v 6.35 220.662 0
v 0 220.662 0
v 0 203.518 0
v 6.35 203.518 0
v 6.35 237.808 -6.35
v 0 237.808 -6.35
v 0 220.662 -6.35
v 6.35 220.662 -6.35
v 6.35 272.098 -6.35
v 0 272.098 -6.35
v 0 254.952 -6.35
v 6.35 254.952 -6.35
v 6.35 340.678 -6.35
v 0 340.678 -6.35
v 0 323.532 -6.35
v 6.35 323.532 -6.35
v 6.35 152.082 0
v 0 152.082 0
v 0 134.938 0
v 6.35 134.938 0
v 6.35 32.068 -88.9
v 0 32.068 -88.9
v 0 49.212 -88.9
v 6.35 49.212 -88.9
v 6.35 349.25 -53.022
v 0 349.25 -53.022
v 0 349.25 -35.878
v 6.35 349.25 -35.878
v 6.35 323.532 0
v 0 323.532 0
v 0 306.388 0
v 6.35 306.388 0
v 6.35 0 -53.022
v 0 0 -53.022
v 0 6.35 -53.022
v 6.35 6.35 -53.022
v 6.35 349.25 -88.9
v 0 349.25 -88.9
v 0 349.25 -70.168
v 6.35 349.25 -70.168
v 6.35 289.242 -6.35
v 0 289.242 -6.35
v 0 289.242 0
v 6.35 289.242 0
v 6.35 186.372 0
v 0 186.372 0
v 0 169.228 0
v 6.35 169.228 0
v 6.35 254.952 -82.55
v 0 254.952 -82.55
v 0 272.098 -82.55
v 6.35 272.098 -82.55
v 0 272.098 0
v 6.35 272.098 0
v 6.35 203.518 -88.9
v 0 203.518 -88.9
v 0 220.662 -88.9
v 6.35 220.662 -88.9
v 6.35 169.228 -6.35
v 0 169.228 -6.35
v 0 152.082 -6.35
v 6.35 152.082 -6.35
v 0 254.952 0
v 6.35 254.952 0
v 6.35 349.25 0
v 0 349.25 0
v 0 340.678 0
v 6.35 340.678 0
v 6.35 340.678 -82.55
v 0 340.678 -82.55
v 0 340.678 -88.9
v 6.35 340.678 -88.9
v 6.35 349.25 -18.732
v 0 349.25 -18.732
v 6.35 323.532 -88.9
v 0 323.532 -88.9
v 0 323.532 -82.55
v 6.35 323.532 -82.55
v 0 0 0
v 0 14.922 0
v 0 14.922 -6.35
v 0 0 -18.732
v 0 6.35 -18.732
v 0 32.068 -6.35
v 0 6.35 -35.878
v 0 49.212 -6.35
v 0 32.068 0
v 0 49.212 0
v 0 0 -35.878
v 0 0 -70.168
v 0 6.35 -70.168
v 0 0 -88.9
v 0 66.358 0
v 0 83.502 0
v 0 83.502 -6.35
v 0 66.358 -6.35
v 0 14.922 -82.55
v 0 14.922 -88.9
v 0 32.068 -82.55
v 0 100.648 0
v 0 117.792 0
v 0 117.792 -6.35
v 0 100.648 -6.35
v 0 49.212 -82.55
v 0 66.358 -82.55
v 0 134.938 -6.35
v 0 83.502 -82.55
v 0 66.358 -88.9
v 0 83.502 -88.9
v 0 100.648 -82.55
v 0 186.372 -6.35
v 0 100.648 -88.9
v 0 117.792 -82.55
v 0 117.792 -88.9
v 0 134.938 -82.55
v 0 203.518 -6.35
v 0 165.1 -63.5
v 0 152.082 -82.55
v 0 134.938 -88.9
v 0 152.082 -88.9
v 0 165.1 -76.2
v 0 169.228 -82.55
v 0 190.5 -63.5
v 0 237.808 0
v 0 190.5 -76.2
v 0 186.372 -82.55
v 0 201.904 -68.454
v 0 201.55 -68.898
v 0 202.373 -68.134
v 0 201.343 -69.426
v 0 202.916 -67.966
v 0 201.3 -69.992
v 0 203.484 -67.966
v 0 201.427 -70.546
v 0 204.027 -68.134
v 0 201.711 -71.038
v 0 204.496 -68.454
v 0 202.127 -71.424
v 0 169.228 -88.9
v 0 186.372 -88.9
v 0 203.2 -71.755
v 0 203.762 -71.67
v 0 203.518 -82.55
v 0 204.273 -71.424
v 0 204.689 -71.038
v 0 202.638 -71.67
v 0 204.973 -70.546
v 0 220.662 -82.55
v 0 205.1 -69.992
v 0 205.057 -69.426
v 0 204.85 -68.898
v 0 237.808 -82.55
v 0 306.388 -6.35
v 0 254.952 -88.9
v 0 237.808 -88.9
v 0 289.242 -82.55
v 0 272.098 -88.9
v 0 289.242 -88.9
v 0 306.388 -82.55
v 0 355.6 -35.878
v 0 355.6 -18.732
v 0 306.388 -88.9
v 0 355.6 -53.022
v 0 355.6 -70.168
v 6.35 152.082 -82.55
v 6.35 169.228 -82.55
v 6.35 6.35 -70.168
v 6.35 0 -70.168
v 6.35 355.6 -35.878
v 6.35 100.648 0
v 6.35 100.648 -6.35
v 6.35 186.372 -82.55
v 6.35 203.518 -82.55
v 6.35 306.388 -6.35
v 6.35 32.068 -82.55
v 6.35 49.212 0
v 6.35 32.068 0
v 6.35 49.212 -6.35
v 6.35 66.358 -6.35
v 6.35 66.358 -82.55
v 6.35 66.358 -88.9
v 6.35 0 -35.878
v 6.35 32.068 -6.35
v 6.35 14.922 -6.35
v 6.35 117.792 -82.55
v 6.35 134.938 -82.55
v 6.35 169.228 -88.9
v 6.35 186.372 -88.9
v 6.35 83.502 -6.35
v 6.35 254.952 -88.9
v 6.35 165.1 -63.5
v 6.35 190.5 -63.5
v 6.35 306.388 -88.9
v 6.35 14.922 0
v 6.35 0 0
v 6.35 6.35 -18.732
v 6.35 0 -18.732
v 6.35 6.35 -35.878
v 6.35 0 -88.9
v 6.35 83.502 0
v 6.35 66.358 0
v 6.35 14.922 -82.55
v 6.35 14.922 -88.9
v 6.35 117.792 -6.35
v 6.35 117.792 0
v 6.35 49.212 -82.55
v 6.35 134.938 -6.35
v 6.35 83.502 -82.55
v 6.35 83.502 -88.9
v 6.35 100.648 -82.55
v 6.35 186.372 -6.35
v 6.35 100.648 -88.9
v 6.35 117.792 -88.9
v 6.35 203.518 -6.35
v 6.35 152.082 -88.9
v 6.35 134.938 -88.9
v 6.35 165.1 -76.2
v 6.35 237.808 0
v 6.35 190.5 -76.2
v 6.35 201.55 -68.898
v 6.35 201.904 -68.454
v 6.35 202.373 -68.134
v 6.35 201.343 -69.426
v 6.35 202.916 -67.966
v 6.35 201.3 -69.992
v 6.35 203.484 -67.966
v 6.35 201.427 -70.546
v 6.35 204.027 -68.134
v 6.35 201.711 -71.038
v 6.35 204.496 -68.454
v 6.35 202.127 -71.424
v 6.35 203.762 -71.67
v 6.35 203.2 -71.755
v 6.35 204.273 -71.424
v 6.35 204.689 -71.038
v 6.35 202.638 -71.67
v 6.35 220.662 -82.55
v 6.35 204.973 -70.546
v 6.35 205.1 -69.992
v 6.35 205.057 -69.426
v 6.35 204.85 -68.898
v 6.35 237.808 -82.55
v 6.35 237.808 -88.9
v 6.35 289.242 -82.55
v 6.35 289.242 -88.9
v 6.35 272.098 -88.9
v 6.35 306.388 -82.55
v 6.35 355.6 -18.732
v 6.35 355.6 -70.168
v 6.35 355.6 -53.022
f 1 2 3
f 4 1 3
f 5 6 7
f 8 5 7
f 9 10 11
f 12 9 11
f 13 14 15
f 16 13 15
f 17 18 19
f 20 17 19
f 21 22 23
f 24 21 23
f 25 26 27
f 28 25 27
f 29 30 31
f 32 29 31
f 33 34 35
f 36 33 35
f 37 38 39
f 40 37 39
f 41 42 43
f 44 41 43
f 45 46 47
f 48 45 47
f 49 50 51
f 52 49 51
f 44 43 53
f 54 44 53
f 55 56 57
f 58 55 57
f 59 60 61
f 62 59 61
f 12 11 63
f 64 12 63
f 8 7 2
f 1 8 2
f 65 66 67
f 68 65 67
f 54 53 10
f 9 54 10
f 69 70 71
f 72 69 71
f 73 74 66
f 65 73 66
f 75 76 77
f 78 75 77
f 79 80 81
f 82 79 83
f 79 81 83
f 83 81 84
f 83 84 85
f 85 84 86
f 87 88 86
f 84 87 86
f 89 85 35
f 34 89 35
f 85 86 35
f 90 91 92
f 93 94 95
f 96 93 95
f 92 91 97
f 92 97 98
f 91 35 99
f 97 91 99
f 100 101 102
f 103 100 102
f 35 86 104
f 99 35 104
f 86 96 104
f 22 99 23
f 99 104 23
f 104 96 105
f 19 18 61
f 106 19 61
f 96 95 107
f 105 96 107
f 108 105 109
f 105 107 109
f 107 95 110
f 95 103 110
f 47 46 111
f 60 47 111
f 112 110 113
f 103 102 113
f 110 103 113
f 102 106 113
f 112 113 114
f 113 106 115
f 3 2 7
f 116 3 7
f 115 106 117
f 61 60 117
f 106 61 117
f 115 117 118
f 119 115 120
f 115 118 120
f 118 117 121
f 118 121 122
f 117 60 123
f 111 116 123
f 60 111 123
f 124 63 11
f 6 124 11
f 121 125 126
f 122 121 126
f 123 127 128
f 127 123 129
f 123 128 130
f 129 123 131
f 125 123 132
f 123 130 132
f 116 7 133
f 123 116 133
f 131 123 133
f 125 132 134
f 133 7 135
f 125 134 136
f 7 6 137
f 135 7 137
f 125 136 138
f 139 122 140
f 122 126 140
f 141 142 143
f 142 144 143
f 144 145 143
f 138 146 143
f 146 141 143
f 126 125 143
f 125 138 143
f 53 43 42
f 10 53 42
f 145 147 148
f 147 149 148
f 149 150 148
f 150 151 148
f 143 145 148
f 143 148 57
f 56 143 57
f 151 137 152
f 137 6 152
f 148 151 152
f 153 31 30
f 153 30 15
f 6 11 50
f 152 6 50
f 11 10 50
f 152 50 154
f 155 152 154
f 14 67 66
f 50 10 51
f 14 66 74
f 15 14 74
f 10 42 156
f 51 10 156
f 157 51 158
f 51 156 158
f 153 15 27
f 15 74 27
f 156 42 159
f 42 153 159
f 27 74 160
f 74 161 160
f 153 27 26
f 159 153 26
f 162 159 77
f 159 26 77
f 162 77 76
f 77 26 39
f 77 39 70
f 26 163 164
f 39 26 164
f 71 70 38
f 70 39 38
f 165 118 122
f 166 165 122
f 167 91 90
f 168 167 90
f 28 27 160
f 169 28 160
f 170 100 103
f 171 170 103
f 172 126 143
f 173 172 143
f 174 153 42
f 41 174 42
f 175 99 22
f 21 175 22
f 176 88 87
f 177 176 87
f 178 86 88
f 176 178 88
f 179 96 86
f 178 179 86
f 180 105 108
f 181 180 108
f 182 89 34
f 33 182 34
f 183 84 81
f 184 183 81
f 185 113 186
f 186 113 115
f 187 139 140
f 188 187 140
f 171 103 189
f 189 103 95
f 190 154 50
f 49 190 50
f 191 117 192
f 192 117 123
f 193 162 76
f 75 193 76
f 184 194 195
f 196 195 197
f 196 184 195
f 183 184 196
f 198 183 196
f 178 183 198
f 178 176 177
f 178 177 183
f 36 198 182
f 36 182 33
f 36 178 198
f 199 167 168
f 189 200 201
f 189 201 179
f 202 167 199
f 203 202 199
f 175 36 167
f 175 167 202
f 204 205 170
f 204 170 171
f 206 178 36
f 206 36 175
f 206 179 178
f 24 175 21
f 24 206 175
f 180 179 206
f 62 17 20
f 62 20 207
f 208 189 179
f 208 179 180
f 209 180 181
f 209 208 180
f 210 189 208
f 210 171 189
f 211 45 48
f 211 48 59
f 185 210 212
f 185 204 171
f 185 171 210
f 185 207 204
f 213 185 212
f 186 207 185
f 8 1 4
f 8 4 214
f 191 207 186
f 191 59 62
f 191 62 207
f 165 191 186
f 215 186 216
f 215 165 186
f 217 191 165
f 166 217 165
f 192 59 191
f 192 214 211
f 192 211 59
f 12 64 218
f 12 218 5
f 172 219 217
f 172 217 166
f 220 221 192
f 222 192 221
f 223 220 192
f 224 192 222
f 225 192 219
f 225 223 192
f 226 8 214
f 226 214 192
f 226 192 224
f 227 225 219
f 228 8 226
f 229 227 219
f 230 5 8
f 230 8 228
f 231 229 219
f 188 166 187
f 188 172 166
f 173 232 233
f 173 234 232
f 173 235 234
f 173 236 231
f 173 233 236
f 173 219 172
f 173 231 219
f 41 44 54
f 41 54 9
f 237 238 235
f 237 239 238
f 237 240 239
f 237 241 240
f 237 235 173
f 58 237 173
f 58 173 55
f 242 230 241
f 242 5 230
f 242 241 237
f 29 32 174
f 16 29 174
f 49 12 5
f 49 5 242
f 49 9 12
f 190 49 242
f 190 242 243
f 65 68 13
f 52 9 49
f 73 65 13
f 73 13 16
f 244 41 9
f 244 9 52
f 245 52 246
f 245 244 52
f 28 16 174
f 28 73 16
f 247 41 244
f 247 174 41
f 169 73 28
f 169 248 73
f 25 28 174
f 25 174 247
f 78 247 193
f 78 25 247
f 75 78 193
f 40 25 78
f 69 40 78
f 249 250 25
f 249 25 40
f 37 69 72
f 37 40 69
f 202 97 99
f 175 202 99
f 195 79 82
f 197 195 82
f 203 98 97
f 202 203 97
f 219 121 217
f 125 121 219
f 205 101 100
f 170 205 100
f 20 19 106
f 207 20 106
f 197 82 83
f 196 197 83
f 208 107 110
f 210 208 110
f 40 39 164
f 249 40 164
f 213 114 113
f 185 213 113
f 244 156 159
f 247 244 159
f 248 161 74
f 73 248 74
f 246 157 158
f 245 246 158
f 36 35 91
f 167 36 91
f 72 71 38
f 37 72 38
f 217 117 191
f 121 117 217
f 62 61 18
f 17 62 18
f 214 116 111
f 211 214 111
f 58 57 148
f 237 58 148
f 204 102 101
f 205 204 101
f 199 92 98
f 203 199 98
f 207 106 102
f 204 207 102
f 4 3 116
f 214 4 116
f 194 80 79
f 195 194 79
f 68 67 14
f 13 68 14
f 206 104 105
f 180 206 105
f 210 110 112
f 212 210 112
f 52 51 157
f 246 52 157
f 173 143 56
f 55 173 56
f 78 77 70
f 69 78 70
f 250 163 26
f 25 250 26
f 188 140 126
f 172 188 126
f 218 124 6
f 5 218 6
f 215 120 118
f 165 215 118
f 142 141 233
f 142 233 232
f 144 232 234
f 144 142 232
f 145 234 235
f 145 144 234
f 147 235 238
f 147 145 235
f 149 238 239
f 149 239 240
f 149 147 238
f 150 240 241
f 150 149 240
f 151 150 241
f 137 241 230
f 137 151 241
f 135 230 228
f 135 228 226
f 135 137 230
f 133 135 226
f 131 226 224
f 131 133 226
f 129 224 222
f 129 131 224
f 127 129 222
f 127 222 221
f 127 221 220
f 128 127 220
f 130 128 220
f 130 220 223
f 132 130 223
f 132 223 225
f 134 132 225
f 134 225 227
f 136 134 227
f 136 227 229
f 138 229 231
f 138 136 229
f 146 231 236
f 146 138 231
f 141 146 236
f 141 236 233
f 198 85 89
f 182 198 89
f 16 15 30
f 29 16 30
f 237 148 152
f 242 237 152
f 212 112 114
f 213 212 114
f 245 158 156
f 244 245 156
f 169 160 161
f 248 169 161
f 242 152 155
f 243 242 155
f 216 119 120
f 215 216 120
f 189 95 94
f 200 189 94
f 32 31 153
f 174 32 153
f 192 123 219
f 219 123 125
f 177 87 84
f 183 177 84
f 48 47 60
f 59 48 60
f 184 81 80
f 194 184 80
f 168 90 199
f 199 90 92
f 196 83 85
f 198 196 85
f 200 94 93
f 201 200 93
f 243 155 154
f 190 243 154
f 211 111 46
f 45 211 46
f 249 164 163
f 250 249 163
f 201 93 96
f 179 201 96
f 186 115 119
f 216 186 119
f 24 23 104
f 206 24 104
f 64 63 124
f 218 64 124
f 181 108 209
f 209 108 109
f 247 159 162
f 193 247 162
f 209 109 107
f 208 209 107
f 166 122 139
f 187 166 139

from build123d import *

# Parameters (mm, degrees)
SKETCH1_W           = 12.7
SKETCH1_H           = 25.4
SKETCH1_R           = 1.905
BOSS_EXTRUDE1_DEPTH = 6.35


with BuildPart() as part:
    # Sketch1 → Boss-Extrude1 (new body)
    with BuildSketch(Plane(origin=(0, 0, 0), x_dir=(0, 0, -1), z_dir=(1, 0, 0))):
        Polygon((0, 14.9225), (0, 6.35), (0, 0), (6.35, 0), (18.7325, 0), (18.7325, 6.35), (35.8775, 6.35), (35.8775, 0), (53.0225, 0), (53.0225, 6.35), (70.1675, 6.35), (70.1675, 0), (82.55, 0), (88.9, 0), (88.9, 6.35), (88.9, 14.9225), (82.55, 14.9225), (82.55, 32.0675), (88.9, 32.0675), (88.9, 49.2125), (82.55, 49.2125), (82.55, 66.3575), (88.9, 66.3575), (88.9, 83.5025), (82.55, 83.5025), (82.55, 100.6475), (88.9, 100.6475), (88.9, 117.7925), (82.55, 117.7925), (82.55, 134.9375), (88.9, 134.9375), (88.9, 152.0825), (82.55, 152.0825), (82.55, 169.2275), (88.9, 169.2275), (88.9, 186.3725), (82.55, 186.3725), (82.55, 203.5175), (88.9, 203.5175), (88.9, 220.6625), (82.55, 220.6625), (82.55, 237.8075), (88.9, 237.8075), (88.9, 254.9525), (82.55, 254.9525), (82.55, 272.0975), (88.9, 272.0975), (88.9, 289.2425), (82.55, 289.2425), (82.55, 306.3875), (88.9, 306.3875), (88.9, 323.5325), (82.55, 323.5325), (82.55, 340.6775), (88.9, 340.6775), (88.9, 349.25), (70.1675, 349.25), (70.1675, 355.6), (53.0225, 355.6), (53.0225, 349.25), (35.8775, 349.25), (35.8775, 355.6), (18.7325, 355.6), (18.7325, 349.25), (6.35, 349.25), (0, 349.25), (0, 340.6775), (6.35, 340.6775), (6.35, 334.518000001), (6.35, 329.692000001), (6.35, 323.5325), (0, 323.5325), (0, 306.3875), (6.35, 306.3875), (6.35, 289.2425), (0, 289.2425), (0, 272.0975), (6.35, 272.0975), (6.35, 254.9525), (0, 254.9525), (0, 237.8075), (6.35, 237.8075), (6.35, 220.6625), (0, 220.6625), (0, 203.5175), (6.35, 203.5175), (6.35, 186.3725), (0, 186.3725), (0, 169.2275), (6.35, 169.2275), (6.35, 152.0825), (0, 152.0825), (0, 134.9375), (6.35, 134.9375), (6.35, 117.7925), (0, 117.7925), (0, 100.6475), (6.35, 100.6475), (6.35, 83.5025), (0, 83.5025), (0, 66.3575), (6.35, 66.3575), (6.35, 49.2125), (0, 49.2125), (0, 32.0675), (6.35, 32.0675), (6.35, 25.907999999), (6.35, 21.081999999), (6.35, 14.9225), align=None)
        with Locations((69.85, 177.8)):
            Rectangle(SKETCH1_W, SKETCH1_H, mode=Mode.SUBTRACT)
        with Locations((69.85, 203.2)):
            Circle(SKETCH1_R, mode=Mode.SUBTRACT)
    extrude(amount=BOSS_EXTRUDE1_DEPTH)


solid = part.part
